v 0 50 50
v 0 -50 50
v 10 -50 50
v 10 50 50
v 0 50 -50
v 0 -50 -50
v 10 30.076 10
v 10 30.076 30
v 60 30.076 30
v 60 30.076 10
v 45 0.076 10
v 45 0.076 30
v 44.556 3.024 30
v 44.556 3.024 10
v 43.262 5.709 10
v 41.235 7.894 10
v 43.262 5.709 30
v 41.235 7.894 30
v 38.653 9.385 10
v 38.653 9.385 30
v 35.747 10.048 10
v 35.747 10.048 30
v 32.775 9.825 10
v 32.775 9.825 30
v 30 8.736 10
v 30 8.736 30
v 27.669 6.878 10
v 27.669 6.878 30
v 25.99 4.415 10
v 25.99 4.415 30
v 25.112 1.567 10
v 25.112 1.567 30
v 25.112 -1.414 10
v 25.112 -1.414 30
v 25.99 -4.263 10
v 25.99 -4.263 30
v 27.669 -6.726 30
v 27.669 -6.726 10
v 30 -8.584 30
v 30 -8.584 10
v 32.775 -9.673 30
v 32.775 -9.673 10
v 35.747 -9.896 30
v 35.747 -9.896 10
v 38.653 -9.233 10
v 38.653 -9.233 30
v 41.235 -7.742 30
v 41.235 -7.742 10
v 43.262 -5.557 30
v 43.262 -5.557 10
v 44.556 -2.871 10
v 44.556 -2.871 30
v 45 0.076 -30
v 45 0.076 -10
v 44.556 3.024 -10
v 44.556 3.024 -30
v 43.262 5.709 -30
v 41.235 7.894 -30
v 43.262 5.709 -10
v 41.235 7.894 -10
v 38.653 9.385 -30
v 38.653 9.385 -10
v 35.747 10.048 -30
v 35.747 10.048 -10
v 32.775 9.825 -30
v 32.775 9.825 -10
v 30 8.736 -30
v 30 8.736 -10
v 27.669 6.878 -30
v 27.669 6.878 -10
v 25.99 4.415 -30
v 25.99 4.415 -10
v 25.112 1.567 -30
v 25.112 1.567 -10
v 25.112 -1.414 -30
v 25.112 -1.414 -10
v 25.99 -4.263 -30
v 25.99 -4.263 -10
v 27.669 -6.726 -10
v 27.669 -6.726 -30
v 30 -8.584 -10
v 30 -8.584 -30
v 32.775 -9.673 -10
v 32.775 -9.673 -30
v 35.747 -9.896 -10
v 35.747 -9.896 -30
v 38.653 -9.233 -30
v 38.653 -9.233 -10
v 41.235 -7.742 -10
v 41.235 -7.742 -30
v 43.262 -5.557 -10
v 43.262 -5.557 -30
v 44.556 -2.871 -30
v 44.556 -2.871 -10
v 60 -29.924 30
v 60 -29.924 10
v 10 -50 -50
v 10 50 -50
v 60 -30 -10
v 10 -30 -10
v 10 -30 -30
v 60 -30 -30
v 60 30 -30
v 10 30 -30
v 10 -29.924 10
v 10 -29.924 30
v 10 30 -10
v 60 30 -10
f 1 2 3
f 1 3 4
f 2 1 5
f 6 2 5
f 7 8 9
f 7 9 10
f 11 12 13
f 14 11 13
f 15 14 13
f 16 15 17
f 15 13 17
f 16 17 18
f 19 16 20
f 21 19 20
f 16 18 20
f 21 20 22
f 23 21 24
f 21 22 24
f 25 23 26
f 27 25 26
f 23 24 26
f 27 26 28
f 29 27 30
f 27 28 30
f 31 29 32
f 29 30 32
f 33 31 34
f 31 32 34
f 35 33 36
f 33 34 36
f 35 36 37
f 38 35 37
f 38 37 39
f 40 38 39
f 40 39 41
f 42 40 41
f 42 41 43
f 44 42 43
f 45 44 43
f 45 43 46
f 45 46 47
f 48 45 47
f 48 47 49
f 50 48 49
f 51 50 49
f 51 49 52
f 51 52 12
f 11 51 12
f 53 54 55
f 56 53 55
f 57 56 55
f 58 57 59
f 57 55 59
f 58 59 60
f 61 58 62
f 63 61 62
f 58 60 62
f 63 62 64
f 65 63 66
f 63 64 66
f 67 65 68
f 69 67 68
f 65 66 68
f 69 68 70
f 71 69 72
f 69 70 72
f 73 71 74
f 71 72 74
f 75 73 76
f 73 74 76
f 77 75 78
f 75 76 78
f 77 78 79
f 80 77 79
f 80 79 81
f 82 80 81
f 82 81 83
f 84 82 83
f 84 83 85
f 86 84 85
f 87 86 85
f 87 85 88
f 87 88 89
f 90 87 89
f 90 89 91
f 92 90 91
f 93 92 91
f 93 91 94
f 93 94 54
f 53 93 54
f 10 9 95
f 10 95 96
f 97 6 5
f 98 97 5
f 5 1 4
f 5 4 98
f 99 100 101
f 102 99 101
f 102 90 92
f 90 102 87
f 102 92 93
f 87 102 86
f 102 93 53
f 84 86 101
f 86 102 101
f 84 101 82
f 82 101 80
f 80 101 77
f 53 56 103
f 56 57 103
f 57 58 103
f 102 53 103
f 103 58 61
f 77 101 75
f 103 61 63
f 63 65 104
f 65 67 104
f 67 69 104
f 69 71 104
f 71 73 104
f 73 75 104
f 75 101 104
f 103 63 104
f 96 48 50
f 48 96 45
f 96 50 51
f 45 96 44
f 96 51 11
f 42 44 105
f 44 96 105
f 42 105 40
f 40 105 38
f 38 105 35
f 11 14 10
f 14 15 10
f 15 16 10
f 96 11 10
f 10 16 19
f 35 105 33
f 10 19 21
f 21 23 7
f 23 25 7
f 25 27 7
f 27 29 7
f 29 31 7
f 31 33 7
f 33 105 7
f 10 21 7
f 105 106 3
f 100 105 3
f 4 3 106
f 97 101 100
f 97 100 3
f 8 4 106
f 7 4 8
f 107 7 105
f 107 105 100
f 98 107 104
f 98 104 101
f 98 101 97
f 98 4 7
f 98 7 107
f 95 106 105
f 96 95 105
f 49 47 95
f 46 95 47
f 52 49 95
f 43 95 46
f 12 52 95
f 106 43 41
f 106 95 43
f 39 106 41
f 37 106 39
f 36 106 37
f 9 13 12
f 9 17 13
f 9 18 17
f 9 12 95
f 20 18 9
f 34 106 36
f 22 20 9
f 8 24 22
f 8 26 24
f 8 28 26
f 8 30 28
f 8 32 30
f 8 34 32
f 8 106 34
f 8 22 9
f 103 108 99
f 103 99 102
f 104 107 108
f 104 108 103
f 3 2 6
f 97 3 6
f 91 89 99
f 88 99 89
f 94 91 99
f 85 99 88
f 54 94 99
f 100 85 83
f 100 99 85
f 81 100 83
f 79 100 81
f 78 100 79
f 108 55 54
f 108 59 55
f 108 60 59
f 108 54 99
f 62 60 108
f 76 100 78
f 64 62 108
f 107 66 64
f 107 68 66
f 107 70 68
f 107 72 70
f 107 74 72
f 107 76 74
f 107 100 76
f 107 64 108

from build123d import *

# Parameters (mm, degrees)
SKETCH5_W           = 100
SKETCH5_H           = 100
BOSS_EXTRUDE3_DEPTH = 10
SKETCH6_W           = 20
SKETCH6_H           = 60
BOSS_EXTRUDE4_DEPTH = 50
SKETCH7_R           = 10
CUT_EXTRUDE2_DEPTH  = 60


with BuildPart() as part:
    # Sketch5 → Boss-Extrude3 (new body)
    with BuildSketch(Plane(origin=(0, 0, 0), x_dir=(0, 0, -1), z_dir=(1, 0, 0))):
        Rectangle(SKETCH5_W, SKETCH5_H)
    extrude(amount=BOSS_EXTRUDE3_DEPTH)

    # Sketch6 → Boss-Extrude4 (add)
    with BuildSketch(Plane(origin=(10, 0, 0), x_dir=(0, 0, -1), z_dir=(1, 0, 0))):
        with Locations((-20, 0.076080003)):
            Rectangle(SKETCH6_W, SKETCH6_H)
        with Locations((20, 0)):
            Rectangle(SKETCH6_W, SKETCH6_H)
    extrude(amount=BOSS_EXTRUDE4_DEPTH)

    # Sketch7 → Cut-Extrude2 (cut)
    with BuildSketch(Plane.XY.offset(30)):
        with Locations((35, 0.076080003)):
            Circle(SKETCH7_R)
    extrude(amount=-CUT_EXTRUDE2_DEPTH, mode=Mode.SUBTRACT)


solid = part.part
